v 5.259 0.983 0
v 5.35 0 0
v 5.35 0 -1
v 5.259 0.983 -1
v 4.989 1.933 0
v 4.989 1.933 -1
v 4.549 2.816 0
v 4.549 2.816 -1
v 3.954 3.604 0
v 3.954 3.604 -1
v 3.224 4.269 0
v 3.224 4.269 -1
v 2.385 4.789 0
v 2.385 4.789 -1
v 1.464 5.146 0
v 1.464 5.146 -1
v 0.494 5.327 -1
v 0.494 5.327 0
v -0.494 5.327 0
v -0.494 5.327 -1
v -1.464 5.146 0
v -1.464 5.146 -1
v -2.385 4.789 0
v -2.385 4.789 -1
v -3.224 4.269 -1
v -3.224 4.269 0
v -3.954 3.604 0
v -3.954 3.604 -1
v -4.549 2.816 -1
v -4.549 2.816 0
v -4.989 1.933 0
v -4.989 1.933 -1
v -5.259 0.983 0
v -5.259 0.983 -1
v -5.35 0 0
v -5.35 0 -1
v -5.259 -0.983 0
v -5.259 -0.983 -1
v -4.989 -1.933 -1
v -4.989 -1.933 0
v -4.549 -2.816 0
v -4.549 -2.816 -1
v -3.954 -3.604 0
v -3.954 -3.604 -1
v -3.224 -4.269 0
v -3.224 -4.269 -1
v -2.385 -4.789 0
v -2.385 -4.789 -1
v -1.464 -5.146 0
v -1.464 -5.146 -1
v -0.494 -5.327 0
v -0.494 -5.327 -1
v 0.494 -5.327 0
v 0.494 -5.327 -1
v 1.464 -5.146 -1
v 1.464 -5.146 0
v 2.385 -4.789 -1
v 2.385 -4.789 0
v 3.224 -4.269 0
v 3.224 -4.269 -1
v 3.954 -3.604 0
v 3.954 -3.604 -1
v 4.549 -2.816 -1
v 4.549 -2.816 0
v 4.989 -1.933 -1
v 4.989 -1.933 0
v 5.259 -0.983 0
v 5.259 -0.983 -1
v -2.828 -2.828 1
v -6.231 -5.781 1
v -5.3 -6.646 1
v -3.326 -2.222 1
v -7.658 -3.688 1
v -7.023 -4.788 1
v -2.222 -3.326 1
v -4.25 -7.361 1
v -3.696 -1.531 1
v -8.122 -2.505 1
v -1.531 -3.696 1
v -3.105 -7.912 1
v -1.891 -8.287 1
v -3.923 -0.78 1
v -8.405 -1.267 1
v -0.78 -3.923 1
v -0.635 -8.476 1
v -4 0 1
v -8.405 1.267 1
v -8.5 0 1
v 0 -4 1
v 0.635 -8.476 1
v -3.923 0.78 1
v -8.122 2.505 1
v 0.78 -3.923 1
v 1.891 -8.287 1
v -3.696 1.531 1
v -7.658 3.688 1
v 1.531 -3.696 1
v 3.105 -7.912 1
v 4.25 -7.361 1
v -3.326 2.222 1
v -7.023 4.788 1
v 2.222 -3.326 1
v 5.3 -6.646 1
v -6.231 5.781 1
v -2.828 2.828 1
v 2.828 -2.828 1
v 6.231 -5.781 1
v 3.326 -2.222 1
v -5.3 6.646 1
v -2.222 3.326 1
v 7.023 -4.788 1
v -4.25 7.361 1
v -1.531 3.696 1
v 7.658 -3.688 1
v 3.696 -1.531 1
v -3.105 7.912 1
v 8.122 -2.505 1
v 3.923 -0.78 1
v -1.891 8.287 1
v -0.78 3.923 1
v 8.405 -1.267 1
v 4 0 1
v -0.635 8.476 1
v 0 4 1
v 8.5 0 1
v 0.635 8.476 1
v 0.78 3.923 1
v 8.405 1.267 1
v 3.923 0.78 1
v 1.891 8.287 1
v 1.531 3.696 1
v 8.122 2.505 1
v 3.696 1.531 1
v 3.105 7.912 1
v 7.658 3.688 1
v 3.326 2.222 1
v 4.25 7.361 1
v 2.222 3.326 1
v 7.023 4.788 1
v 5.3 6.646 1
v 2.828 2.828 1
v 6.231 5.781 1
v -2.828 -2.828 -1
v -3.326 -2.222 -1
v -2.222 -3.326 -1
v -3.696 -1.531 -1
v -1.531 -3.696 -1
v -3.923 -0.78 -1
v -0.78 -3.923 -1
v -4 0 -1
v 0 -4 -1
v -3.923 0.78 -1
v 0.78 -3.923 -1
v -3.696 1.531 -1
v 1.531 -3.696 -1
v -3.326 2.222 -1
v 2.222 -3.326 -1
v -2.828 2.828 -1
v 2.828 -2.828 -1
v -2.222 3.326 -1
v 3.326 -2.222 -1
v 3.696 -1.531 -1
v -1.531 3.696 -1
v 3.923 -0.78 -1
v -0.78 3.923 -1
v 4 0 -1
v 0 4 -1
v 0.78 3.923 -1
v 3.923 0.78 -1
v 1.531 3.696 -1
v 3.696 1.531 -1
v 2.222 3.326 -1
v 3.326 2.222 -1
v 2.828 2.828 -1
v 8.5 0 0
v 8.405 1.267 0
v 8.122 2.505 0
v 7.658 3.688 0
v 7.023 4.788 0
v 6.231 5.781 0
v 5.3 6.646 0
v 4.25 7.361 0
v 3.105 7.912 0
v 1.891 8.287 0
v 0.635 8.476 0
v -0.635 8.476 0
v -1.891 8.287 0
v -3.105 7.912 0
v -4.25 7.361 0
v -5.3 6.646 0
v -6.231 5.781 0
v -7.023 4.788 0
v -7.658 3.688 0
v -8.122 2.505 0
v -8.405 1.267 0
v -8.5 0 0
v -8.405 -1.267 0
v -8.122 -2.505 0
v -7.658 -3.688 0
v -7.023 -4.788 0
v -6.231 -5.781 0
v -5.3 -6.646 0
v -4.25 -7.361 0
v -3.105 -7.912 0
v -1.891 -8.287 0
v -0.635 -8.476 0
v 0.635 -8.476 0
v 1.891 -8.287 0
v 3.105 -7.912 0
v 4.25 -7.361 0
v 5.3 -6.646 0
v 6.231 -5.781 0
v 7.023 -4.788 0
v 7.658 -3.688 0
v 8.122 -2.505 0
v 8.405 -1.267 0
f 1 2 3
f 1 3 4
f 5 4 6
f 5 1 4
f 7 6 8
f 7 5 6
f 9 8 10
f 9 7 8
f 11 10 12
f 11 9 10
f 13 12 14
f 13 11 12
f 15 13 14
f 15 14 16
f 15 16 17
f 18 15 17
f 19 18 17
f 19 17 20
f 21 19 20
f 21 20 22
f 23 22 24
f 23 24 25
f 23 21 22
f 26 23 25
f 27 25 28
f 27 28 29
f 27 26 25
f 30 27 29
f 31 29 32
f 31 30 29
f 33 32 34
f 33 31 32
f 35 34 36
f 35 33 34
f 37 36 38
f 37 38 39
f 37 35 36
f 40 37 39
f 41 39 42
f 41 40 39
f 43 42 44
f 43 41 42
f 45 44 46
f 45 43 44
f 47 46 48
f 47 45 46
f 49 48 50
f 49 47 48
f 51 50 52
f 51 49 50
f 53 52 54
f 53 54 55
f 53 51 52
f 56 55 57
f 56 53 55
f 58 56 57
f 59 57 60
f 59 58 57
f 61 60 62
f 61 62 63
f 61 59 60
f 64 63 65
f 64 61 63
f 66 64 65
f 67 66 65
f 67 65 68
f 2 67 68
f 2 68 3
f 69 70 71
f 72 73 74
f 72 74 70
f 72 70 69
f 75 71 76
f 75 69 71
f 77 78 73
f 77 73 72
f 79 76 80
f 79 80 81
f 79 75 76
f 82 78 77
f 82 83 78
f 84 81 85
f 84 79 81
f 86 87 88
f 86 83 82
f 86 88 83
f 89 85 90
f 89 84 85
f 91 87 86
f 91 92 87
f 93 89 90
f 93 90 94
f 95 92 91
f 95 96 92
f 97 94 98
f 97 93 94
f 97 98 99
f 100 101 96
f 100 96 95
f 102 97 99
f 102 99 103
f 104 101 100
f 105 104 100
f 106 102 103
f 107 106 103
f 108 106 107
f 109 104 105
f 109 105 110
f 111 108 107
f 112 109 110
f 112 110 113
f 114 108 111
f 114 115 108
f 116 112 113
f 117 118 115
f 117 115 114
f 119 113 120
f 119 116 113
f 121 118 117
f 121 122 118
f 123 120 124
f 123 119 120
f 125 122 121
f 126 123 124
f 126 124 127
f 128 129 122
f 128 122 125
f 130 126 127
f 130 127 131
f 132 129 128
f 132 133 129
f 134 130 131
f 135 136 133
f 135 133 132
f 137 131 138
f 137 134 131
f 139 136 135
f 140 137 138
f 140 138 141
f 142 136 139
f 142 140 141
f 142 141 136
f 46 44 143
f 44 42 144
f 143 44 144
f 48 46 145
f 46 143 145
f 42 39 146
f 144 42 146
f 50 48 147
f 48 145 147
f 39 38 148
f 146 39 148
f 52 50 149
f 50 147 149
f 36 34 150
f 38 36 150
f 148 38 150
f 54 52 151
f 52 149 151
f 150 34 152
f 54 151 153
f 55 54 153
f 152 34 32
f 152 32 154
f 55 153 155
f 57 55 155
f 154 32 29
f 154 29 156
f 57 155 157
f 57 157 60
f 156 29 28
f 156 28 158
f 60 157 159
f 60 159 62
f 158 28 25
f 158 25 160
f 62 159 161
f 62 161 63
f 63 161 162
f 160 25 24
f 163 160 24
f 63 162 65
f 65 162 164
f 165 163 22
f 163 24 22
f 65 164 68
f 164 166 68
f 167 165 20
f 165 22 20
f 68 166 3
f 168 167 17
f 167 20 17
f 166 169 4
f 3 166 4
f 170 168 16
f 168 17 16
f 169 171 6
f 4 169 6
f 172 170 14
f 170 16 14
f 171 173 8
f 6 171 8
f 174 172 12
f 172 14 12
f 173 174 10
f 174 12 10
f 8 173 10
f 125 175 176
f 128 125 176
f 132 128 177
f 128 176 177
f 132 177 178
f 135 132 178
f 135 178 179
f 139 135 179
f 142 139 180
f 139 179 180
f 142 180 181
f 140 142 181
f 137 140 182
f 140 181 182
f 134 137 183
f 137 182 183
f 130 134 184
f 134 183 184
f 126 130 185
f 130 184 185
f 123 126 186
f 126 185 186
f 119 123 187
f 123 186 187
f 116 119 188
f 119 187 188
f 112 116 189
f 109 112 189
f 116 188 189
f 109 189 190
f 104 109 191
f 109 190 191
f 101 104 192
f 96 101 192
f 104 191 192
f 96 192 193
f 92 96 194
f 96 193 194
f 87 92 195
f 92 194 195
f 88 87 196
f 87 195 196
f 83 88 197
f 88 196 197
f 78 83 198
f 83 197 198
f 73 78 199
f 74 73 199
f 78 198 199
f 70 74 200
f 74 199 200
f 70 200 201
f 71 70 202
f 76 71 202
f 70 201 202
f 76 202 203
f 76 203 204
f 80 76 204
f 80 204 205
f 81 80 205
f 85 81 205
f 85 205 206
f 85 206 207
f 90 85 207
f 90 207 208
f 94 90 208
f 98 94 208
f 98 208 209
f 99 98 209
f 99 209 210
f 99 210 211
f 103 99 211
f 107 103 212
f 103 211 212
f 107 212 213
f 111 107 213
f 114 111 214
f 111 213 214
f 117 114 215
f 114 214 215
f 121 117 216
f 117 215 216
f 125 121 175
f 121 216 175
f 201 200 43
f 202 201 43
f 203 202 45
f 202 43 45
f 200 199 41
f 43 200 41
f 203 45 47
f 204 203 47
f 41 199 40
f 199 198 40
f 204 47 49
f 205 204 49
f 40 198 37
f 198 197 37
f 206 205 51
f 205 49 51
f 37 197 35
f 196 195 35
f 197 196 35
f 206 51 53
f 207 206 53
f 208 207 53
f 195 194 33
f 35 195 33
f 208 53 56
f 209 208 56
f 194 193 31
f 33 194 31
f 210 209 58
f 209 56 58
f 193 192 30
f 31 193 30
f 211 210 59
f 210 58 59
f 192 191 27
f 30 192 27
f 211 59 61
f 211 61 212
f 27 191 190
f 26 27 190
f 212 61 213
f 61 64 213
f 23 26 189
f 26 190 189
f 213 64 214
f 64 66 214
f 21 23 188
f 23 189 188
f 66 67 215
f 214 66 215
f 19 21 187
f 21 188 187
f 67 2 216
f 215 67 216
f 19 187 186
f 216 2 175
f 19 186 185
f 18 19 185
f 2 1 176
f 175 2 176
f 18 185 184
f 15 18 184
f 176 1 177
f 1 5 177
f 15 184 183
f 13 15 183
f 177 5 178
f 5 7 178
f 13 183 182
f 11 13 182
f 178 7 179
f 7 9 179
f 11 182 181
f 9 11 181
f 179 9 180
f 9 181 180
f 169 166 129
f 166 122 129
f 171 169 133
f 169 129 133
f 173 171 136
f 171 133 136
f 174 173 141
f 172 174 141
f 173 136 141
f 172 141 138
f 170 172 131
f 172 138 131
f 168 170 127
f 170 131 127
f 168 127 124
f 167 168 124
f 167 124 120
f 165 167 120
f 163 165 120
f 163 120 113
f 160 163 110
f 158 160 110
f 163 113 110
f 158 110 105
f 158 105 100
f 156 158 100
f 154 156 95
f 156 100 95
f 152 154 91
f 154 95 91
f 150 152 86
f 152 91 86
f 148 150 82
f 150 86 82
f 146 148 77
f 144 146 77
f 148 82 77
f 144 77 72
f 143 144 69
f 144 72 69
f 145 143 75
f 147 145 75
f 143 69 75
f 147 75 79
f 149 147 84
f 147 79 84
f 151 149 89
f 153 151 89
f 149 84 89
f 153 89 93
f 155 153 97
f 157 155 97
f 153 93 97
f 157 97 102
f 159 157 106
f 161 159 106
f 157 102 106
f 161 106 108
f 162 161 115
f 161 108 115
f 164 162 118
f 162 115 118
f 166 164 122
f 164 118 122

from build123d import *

# Parameters (mm, degrees)
SKETCH_R     = 8.5
PAD_DEPTH    = 1
SKETCH001_R  = 5.35
PAD001_DEPTH = 1
SKETCH002_R  = 4
POCKET_DEPTH = 2.5


with BuildPart() as part:
    # Sketch → Pad (new body)
    with BuildSketch(Plane.XY):
        Circle(SKETCH_R)
    extrude(amount=PAD_DEPTH)

    # Sketch001 → Pad001 (join)
    with BuildSketch(Plane.XY):
        Circle(SKETCH001_R)
    extrude(amount=-PAD001_DEPTH)

    # Sketch002 → Pocket (cut, symmetric)
    with BuildSketch(Plane.XY):
        Circle(SKETCH002_R)
    extrude(amount=POCKET_DEPTH, both=True, mode=Mode.SUBTRACT)


solid = part.part
